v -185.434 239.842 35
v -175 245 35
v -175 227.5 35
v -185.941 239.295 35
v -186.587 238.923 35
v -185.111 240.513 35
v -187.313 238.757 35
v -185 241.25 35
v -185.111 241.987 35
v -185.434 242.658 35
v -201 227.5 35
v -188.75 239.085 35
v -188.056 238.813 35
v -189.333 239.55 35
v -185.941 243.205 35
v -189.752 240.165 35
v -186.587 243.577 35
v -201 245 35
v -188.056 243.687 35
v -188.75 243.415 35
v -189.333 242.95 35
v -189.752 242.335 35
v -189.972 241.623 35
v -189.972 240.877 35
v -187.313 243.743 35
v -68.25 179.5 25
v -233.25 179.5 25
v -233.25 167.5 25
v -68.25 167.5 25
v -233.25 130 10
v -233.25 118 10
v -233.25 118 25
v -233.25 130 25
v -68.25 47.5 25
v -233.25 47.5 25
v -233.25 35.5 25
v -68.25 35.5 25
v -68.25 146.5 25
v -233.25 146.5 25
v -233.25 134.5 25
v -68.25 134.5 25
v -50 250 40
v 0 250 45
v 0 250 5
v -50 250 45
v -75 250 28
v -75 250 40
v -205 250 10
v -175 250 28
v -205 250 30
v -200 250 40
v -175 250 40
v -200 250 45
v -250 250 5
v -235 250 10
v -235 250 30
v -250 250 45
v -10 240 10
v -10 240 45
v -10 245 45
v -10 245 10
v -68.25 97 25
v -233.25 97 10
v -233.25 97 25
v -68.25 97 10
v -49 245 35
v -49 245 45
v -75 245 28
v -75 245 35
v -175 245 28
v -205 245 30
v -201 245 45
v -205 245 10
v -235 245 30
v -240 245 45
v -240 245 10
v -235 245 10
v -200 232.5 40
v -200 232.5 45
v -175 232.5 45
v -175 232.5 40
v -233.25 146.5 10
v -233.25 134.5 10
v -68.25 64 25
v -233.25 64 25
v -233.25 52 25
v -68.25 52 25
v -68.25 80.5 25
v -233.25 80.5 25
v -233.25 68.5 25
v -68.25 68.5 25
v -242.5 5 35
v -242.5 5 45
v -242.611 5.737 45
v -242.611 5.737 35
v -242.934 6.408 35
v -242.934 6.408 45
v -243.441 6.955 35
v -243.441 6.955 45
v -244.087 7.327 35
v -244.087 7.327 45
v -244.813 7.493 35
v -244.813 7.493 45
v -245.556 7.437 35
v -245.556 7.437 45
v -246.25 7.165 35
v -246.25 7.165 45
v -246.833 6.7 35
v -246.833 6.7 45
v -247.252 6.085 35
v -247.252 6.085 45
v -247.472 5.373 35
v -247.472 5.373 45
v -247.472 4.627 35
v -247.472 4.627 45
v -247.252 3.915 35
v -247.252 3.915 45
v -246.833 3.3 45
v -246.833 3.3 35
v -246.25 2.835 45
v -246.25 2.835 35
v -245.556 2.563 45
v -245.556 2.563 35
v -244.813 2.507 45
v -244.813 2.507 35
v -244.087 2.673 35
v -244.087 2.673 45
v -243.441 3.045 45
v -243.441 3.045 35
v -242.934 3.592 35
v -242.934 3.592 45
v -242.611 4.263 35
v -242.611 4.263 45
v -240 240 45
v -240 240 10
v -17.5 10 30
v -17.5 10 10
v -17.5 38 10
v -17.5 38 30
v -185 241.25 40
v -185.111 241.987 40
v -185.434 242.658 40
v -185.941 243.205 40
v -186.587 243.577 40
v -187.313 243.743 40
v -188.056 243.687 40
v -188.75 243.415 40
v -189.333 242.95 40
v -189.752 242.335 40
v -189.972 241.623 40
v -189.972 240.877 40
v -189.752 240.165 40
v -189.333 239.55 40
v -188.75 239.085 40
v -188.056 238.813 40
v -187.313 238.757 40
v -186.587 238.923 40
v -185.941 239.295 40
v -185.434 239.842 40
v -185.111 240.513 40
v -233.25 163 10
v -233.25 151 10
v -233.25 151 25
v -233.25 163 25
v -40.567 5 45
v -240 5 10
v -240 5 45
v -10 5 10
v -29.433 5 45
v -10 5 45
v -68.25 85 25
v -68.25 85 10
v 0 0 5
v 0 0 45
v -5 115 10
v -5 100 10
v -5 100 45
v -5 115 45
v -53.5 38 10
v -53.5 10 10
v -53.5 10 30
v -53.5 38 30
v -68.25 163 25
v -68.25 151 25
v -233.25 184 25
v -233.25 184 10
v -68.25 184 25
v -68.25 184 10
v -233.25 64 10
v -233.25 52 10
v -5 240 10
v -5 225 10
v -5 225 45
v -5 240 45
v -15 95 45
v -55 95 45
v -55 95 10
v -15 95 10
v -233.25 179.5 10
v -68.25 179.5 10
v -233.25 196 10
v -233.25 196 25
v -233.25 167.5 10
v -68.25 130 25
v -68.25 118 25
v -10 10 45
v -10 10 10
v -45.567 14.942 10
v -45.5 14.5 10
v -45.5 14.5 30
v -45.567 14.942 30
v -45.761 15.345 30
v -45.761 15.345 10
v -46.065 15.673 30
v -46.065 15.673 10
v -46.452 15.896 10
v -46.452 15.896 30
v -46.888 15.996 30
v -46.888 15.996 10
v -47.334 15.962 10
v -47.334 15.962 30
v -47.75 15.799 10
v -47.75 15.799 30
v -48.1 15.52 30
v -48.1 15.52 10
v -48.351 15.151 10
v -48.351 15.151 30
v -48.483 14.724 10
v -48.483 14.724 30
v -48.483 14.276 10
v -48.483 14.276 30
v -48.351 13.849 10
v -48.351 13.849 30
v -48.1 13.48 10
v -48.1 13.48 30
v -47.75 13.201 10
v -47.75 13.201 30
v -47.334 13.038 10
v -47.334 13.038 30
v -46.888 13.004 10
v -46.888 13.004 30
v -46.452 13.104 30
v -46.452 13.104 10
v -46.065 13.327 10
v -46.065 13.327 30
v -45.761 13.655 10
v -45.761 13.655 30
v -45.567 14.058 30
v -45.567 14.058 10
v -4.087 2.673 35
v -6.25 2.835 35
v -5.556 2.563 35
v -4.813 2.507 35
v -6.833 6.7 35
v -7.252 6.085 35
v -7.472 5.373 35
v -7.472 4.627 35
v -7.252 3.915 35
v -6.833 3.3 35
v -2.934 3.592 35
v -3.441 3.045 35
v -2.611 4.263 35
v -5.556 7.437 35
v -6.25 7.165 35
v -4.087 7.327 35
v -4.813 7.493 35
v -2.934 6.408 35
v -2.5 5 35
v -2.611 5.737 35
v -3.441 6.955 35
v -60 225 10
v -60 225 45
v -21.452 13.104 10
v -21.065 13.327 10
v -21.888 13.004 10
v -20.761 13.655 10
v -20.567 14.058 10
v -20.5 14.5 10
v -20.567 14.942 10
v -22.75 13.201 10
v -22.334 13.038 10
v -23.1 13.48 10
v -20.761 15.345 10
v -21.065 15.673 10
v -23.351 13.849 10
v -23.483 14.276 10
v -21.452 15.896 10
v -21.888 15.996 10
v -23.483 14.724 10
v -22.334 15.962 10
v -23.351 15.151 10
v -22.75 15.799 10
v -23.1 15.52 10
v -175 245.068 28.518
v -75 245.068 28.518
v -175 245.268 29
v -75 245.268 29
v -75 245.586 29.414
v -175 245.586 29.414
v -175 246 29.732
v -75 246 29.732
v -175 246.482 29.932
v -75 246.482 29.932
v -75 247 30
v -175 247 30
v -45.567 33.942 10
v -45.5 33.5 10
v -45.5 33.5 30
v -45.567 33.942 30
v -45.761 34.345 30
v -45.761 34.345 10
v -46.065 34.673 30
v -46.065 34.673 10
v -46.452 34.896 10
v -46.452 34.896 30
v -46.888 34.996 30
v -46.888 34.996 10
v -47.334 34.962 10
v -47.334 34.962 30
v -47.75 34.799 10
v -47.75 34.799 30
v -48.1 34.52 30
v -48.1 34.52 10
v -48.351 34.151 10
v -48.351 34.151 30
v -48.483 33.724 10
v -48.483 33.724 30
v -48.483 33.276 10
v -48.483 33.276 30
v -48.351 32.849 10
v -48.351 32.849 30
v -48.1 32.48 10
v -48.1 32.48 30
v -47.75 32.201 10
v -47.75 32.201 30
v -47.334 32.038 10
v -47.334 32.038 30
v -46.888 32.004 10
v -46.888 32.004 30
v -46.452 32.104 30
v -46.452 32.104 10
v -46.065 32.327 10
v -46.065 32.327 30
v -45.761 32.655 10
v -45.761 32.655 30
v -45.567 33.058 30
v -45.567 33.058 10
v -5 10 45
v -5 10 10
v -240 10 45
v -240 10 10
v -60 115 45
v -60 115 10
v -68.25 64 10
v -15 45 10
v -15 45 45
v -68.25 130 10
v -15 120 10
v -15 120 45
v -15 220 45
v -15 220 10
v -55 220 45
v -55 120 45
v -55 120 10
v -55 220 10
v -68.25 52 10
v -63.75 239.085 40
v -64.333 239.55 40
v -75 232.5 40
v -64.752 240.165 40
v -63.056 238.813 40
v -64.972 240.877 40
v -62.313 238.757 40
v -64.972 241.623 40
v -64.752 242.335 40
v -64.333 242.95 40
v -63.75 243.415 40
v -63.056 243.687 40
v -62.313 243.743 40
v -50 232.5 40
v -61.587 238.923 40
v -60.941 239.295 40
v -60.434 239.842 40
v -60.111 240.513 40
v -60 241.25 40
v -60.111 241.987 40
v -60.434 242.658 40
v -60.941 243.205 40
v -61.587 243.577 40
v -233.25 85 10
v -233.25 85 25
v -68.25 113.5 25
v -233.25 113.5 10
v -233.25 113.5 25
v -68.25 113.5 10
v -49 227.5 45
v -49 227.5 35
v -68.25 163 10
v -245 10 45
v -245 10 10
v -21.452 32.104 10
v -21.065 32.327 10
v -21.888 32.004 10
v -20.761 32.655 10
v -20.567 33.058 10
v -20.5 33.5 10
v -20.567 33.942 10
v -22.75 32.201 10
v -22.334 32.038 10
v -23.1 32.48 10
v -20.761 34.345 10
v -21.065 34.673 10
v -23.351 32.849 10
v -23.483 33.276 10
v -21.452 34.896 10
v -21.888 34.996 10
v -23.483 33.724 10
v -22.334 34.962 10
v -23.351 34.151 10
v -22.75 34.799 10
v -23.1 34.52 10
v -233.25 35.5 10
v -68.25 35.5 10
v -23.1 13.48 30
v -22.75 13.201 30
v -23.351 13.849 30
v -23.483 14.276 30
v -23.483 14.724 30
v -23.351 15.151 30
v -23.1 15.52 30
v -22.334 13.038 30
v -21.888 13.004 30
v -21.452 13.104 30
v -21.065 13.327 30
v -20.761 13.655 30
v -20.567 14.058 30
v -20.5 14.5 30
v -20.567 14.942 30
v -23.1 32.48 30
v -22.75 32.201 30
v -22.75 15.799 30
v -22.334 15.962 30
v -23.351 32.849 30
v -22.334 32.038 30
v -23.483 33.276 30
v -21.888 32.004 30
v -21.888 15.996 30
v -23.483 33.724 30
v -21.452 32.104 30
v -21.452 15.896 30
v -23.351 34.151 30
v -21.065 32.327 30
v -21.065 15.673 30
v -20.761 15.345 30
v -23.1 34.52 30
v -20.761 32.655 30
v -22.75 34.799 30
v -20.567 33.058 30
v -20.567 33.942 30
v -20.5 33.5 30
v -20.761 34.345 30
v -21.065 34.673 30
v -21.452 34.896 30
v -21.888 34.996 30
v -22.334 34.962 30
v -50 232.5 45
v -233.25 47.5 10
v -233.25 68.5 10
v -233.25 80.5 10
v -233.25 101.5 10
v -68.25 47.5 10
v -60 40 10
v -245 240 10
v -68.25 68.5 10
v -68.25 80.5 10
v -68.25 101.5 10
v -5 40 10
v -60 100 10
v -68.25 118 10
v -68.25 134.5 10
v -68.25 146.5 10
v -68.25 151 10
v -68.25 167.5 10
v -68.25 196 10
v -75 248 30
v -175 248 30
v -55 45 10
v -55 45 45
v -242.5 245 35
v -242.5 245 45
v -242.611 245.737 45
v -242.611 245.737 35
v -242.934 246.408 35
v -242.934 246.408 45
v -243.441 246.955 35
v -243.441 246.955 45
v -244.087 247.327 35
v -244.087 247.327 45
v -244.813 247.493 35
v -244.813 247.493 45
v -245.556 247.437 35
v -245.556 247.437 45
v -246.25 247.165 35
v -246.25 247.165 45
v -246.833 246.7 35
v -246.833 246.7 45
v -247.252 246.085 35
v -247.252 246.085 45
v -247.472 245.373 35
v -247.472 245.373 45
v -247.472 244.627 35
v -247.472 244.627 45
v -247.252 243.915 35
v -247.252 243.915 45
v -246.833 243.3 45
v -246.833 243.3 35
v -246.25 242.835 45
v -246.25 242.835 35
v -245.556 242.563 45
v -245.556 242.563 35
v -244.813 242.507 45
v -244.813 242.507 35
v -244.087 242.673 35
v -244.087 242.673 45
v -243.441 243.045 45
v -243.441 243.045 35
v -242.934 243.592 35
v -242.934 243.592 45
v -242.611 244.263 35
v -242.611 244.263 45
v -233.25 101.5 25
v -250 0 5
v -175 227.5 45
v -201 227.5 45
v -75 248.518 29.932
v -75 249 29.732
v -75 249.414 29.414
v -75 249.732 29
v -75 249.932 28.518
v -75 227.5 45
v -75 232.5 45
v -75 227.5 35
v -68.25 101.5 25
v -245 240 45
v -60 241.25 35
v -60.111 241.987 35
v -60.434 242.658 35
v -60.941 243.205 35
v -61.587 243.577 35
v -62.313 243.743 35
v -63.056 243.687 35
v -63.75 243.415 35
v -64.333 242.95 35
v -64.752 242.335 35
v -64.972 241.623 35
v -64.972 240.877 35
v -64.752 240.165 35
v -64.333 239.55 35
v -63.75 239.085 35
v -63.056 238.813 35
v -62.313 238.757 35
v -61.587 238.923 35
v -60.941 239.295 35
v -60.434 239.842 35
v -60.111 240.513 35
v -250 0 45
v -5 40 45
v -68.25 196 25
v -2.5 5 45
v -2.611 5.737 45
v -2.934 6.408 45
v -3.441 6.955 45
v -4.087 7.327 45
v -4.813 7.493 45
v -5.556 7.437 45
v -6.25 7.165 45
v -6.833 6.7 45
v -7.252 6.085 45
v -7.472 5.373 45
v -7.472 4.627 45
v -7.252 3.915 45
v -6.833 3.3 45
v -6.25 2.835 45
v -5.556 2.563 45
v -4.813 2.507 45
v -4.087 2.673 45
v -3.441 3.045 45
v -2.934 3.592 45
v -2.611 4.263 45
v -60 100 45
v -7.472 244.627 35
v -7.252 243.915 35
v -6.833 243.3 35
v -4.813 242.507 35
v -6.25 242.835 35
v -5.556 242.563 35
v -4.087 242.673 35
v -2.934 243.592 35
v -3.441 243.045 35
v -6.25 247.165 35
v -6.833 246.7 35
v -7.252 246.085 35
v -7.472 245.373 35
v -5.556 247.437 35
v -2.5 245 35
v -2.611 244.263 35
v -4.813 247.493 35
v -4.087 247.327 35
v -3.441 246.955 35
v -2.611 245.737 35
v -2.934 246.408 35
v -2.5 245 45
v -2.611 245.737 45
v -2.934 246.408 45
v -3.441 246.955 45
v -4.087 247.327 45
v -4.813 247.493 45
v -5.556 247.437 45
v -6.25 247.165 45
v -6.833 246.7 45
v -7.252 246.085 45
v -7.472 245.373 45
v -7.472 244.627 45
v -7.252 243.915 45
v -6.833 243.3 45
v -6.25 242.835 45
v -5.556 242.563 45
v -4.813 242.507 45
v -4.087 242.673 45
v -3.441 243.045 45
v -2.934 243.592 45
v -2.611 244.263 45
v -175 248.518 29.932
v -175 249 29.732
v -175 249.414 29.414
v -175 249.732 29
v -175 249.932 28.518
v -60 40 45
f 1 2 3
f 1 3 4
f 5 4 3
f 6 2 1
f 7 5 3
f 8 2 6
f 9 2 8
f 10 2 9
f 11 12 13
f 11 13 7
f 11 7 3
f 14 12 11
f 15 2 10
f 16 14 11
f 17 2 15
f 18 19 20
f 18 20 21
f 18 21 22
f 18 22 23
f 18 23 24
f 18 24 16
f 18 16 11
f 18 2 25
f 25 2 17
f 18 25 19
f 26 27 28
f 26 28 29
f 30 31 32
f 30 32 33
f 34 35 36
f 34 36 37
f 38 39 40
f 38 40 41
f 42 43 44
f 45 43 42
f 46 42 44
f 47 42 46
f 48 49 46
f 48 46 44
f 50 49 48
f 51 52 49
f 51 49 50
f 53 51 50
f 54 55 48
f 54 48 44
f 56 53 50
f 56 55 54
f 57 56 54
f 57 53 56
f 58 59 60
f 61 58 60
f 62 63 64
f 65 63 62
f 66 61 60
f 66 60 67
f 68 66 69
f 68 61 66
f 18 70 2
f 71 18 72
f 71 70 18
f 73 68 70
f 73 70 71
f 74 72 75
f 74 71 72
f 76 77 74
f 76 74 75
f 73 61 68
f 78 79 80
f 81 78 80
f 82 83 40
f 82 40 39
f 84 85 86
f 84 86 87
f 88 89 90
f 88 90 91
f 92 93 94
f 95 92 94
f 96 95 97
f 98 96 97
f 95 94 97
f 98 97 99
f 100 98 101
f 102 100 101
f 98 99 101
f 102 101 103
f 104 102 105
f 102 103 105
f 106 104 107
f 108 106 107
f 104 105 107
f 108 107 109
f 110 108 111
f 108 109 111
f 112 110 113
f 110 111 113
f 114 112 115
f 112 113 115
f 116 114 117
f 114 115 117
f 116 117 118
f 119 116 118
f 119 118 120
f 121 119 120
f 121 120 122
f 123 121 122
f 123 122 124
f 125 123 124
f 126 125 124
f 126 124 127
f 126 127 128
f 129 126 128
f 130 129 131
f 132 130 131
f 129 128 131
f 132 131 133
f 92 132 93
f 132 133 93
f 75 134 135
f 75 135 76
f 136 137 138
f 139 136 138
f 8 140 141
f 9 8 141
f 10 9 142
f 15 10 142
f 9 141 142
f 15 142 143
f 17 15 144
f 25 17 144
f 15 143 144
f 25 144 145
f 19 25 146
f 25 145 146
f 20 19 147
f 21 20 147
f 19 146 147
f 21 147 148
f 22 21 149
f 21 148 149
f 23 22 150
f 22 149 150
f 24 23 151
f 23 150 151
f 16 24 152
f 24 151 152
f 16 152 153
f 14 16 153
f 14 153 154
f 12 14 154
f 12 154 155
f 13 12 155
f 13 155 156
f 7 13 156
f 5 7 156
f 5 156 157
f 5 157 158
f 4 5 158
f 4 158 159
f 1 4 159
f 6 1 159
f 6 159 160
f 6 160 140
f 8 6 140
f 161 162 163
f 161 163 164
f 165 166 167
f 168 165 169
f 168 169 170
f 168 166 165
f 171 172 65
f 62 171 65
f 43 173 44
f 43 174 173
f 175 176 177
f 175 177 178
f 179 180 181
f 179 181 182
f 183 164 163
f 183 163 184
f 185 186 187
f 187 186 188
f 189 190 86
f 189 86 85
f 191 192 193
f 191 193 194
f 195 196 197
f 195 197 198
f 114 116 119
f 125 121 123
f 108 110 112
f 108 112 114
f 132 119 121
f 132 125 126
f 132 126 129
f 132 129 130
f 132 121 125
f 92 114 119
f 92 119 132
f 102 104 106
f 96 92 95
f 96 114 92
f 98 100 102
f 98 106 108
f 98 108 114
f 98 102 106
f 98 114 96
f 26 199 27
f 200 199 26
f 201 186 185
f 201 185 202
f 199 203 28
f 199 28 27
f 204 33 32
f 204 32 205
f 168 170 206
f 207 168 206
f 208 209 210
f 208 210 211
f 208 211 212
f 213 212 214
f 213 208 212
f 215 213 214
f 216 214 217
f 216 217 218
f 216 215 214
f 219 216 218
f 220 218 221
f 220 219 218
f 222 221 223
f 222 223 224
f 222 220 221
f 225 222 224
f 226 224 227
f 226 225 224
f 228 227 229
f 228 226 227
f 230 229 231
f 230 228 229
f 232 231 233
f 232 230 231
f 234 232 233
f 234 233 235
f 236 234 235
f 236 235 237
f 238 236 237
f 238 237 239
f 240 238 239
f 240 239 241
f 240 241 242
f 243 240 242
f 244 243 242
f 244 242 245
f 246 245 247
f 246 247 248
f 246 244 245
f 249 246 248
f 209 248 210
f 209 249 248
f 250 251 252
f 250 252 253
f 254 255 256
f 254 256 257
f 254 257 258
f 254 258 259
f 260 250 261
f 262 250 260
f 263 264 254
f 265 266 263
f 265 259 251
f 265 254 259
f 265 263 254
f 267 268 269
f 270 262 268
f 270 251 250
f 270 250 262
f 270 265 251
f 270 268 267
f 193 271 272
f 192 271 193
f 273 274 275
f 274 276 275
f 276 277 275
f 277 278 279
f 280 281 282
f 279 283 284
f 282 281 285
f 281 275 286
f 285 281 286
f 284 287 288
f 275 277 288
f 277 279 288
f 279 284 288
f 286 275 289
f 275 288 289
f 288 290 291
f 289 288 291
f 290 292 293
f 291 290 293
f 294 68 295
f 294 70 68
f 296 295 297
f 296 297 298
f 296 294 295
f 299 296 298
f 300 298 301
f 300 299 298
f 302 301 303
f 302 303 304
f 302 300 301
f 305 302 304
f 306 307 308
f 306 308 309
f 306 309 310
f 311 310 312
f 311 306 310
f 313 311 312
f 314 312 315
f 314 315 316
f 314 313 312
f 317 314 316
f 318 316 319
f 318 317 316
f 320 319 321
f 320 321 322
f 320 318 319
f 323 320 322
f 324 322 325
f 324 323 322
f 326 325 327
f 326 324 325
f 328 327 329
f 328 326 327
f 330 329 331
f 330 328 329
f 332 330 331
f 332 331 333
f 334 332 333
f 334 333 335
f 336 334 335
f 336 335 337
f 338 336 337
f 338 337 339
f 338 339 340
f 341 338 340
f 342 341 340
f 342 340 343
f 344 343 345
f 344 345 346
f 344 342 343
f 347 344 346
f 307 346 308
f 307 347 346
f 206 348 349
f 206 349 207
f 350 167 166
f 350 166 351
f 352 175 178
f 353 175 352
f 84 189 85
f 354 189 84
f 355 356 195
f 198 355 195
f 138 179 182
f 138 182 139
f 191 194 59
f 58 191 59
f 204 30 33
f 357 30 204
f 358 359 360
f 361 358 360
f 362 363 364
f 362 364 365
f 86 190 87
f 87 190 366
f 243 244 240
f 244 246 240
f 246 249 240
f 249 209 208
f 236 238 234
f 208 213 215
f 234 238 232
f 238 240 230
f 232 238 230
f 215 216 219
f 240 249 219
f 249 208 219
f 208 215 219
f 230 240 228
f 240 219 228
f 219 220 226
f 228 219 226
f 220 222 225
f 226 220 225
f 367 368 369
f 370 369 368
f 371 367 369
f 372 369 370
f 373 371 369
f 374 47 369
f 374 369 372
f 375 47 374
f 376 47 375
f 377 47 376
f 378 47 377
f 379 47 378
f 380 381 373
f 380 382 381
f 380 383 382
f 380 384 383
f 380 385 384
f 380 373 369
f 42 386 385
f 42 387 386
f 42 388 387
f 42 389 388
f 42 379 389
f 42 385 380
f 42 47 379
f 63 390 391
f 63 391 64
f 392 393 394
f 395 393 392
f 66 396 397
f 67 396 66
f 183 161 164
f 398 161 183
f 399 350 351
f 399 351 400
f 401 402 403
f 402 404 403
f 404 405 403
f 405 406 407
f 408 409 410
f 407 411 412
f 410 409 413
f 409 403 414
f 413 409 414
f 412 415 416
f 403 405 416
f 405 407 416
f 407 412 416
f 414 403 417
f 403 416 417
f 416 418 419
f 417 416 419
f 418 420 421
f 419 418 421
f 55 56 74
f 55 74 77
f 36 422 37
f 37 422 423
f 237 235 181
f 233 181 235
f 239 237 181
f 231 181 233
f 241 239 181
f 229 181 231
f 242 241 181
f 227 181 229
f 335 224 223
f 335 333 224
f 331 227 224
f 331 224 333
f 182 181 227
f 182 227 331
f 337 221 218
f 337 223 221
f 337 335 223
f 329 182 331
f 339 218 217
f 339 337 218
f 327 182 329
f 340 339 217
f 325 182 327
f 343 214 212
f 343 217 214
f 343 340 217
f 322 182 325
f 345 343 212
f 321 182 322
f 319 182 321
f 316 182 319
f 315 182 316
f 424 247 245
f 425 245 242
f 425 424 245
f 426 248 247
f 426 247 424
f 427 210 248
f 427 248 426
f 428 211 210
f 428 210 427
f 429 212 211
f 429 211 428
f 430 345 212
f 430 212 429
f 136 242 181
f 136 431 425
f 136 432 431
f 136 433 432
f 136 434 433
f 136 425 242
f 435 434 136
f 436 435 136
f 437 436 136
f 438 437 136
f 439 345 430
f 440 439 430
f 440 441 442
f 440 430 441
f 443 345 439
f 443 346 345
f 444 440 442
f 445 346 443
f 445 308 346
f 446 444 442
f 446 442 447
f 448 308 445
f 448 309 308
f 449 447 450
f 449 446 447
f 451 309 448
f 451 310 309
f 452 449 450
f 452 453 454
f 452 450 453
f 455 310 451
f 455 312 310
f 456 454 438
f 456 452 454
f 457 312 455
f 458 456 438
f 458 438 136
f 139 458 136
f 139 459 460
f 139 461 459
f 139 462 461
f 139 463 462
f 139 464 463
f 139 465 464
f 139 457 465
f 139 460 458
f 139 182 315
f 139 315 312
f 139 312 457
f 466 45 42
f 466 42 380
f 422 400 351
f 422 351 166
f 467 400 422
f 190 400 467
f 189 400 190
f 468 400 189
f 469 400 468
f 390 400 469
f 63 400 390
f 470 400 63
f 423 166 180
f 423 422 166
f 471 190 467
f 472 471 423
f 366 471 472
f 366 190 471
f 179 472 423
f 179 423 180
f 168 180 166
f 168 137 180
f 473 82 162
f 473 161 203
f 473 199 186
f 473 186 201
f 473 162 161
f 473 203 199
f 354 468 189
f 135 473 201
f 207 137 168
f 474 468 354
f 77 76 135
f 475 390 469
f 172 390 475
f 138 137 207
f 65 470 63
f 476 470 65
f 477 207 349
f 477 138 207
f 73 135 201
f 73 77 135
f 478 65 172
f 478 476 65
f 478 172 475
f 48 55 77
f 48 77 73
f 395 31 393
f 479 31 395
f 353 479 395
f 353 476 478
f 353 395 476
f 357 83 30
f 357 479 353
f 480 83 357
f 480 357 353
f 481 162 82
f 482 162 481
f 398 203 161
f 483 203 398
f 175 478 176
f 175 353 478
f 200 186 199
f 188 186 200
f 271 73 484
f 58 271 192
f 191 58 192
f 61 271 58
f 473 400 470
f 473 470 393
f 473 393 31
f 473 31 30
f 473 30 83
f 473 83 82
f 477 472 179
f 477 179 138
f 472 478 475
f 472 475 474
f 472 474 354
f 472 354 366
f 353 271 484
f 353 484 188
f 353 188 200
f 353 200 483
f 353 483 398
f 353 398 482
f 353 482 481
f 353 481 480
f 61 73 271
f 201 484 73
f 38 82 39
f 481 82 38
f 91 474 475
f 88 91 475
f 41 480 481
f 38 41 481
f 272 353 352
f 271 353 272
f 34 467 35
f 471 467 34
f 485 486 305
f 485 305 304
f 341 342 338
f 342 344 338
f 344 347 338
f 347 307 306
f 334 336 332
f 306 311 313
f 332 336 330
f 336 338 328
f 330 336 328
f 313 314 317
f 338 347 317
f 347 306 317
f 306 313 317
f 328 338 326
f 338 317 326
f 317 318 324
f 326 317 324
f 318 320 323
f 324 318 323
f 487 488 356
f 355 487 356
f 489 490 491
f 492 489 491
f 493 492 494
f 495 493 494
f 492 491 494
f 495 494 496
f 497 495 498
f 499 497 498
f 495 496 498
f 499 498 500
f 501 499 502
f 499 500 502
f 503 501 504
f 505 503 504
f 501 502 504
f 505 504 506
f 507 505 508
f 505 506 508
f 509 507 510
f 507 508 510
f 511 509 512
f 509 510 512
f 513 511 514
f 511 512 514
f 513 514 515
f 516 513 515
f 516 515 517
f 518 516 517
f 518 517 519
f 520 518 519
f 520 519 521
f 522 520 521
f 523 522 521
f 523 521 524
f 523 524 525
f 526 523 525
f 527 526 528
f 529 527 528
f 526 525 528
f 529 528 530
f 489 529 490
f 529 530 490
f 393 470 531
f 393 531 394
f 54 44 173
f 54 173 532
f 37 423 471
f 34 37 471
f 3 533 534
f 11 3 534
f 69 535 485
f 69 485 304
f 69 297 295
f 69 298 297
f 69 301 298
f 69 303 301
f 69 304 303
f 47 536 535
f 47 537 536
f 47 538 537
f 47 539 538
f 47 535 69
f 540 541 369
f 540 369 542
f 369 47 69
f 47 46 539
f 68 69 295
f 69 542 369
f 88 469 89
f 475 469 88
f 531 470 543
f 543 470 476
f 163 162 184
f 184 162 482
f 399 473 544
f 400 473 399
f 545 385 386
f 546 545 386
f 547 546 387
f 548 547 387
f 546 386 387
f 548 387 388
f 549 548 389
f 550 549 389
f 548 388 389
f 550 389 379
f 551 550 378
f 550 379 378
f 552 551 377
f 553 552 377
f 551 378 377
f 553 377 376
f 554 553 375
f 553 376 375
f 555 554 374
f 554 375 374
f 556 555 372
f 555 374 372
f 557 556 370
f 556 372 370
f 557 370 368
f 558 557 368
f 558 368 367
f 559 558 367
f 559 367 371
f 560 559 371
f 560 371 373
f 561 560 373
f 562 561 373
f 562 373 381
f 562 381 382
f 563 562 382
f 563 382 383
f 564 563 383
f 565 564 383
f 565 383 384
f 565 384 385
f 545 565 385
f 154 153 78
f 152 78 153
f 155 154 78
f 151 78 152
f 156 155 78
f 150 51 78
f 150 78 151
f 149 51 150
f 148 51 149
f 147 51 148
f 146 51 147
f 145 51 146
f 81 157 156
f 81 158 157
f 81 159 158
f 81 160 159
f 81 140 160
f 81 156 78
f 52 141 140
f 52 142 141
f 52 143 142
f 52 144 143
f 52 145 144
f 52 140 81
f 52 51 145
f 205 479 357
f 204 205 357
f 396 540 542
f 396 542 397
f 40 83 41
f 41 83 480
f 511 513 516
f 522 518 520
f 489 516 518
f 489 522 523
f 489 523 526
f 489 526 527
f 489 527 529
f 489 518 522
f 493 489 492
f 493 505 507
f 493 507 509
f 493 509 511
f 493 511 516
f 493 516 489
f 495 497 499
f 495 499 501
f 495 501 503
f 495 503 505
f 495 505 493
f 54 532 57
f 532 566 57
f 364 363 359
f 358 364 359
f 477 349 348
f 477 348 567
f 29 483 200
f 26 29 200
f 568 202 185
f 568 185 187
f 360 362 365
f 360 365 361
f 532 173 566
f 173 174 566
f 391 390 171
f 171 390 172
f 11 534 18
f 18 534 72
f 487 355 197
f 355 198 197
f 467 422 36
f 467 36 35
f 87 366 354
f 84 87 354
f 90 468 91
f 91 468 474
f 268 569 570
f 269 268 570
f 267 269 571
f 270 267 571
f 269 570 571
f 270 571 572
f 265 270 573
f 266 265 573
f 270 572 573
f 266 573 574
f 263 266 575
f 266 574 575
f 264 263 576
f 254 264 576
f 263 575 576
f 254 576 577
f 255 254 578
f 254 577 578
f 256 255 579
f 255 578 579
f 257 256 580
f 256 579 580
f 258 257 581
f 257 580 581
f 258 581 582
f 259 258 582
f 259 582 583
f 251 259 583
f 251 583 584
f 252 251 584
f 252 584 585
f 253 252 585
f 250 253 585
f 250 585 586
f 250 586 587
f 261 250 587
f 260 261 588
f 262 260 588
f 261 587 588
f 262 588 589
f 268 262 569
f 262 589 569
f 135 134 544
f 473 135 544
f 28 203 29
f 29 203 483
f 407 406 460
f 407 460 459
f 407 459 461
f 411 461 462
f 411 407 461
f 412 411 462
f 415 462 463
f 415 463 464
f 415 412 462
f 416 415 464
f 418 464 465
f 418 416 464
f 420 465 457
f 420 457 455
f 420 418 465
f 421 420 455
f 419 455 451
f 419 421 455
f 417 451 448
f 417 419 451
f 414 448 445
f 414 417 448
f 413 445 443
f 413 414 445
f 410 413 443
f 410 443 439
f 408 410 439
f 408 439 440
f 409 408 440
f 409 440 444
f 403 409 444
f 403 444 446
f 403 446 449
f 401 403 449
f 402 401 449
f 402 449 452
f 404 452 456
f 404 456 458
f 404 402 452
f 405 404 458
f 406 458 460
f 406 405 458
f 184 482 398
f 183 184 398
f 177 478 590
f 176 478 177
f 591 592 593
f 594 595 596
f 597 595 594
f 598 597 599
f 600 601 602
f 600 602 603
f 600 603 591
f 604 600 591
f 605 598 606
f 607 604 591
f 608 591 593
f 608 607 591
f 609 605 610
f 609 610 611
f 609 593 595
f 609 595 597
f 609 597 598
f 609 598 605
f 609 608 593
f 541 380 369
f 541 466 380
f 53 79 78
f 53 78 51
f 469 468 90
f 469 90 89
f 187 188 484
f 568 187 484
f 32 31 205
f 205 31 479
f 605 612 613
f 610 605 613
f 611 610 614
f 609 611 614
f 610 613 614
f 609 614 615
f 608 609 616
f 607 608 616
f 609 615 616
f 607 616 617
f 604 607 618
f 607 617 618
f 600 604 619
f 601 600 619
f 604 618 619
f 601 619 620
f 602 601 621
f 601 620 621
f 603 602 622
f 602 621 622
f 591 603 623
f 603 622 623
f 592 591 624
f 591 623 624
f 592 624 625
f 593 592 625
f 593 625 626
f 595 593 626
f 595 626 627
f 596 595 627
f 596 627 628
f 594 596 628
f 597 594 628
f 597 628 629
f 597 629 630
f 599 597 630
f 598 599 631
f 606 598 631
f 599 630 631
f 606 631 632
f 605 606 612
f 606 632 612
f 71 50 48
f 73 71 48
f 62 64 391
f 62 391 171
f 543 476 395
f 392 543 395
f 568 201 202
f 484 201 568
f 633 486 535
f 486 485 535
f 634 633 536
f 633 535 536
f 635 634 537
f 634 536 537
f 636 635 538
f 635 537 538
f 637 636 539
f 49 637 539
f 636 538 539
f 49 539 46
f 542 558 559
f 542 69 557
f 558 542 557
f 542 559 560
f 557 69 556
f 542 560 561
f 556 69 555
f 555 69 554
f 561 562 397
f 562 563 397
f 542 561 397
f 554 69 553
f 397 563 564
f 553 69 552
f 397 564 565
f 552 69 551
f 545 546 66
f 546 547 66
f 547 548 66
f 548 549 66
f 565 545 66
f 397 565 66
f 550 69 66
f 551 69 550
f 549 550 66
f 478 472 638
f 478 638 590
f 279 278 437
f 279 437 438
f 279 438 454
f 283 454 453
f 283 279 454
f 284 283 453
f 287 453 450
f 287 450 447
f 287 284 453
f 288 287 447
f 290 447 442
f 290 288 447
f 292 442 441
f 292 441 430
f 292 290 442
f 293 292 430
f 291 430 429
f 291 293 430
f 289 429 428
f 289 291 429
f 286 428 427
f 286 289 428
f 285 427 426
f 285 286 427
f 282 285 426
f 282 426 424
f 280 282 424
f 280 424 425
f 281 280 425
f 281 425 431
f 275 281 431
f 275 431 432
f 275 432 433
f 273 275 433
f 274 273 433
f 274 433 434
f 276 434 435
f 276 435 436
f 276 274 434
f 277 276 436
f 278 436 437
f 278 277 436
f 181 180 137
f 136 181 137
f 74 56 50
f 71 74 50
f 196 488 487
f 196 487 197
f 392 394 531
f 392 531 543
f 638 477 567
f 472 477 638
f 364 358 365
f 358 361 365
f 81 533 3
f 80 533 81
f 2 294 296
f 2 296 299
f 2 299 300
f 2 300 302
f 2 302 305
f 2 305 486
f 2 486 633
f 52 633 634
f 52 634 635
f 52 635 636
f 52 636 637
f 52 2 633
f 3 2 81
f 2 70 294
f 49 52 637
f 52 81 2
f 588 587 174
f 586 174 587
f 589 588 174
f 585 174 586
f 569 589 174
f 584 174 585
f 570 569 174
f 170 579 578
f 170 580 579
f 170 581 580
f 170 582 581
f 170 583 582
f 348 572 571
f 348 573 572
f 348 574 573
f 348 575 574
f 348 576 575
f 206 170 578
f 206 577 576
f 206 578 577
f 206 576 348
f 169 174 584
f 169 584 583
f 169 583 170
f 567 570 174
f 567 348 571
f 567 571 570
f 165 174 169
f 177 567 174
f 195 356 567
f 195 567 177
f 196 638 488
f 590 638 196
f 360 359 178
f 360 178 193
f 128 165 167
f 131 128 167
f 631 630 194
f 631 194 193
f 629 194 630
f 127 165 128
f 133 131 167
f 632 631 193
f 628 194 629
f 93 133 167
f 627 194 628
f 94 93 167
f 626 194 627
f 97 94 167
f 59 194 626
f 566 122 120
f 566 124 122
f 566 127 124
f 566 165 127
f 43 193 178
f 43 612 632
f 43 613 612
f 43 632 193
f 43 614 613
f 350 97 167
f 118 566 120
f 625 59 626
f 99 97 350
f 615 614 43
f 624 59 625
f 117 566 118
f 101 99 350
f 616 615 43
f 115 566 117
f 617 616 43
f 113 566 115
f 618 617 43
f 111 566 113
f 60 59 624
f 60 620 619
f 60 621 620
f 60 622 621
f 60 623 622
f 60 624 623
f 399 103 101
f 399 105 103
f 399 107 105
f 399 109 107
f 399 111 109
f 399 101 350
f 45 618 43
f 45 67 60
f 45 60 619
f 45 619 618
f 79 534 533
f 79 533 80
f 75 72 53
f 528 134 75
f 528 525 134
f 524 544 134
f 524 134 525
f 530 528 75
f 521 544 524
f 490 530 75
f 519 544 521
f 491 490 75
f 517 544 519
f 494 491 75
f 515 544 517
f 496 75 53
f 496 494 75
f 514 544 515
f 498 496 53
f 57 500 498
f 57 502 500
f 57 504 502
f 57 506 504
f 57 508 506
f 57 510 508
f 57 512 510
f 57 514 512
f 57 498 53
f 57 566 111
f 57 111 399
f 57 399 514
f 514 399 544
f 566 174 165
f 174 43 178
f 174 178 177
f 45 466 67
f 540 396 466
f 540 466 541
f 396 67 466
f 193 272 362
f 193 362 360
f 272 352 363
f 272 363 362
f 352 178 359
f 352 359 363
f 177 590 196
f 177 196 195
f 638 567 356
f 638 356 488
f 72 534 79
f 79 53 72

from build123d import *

# Parameters (mm, degrees)
SKETCH1_W                        = 250
SKETCH1_H                        = 250
BOSS_EXTRUDE1_DEPTH              = 50
SKETCH2_W                        = 40
SKETCH2_H                        = 100
SKETCH2_H_2                      = 50
CUT_EXTRUDE1_DEPTH               = 45
FILLET1_R                        = 5
FILLET2_R                        = 5
SKETCH5_R                        = 6.25
CUT_EXTRUDE2_DEPTH               = 22
FILLET5_R                        = 1.5
LPATTERN4_COUNT                  = 10
LPATTERN4_PITCH                  = 16.5
LPATTERN4_COUNT_DIR2             = 10
LPATTERN4_PITCH_DIR2             = 16.5
FILLET5_OF_LPATTERN4_R           = 1.5
CUT_EXTRUDE4_DEPTH               = 45
SKETCH8_W                        = 100
SKETCH8_H                        = 20
CUT_EXTRUDE5_DEPTH               = 20
FILLET6_R                        = 2.5
FILLET7_R                        = 2
SKETCH10_R                       = 13.5
CUT_EXTRUDE6_DEPTH               = 358.071421427
SKETCH4_W                        = 25
SKETCH4_H                        = 17.5
CUT_EXTRUDE7_DEPTH               = 10
VERRUNDUNG1_R                    = 2.5
SKIZZE2_W                        = 25
SKIZZE2_H                        = 5
AUFSATZ_LINEAR_AUSTRAGEN1_DEPTH  = 12.5
AUFSATZ_LINEAR_AUSTRAGEN2_DEPTH  = 10
SKIZZE11_W                       = 164
SKIZZE11_H                       = 164
SCHNITT_LINEAR_AUSTRAGEN6_DEPTH  = 10
SKIZZE12_W                       = 174
SKIZZE12_H                       = 174
SCHNITT_LINEAR_AUSTRAGEN7_DEPTH  = 2.5
SKIZZE13_R                       = 1.5
SCHNITT_LINEAR_AUSTRAGEN8_DEPTH  = 2.5
SKIZZE14_W                       = 10
SKIZZE14_H                       = 10
AUFSATZ_LINEAR_AUSTRAGEN3_DEPTH  = 45
SKIZZE16_W                       = 5
SKIZZE16_H                       = 250
SCHNITT_LINEAR_AUSTRAGEN9_DEPTH  = 358.071421427
SKIZZE18_R                       = 2.5
SCHNITT_LINEAR_AUSTRAGEN10_DEPTH = 10
SKIZZE21_W                       = 250
SKIZZE21_H                       = 250
SCHNITT_LINEAR_AUSTRAGEN13_DEPTH = 10
SKIZZE25_W                       = 250
SKIZZE25_H                       = 250
AUFSATZ_LINEAR_AUSTRAGEN7_DEPTH  = 5
SKIZZE26_W                       = 36
SKIZZE26_H                       = 28
SKIZZE26_R                       = 1.5
AUFSATZ_LINEAR_AUSTRAGEN8_DEPTH  = 20
SKIZZE27_W                       = 165
SKIZZE27_H                       = 12
AUFSATZ_LINEAR_AUSTRAGEN9_DEPTH  = 15
SKIZZE28_W                       = 30
SKIZZE28_H                       = 20
SCHNITT_LINEAR_AUSTRAGEN14_DEPTH = 15
SKIZZE29_R                       = 2.5
SCHNITT_LINEAR_AUSTRAGEN15_DEPTH = 15


with BuildPart() as part:
    # Sketch1 → Boss-Extrude1 (new body)
    with BuildSketch(Plane.XY):
        with Locations((-125, 125)):
            Rectangle(SKETCH1_W, SKETCH1_H)
    extrude(amount=BOSS_EXTRUDE1_DEPTH)

    # Sketch2 → Cut-Extrude1 (cut)
    with BuildSketch(Plane.XY.offset(50)):
        with Locations((-35, 170)):
            Rectangle(SKETCH2_W, SKETCH2_H)
        with Locations((-35, 70)):
            Rectangle(SKETCH2_W, SKETCH2_H_2)
    extrude(amount=-CUT_EXTRUDE1_DEPTH, mode=Mode.SUBTRACT)

    # Fillet1
    fillet1_edges = [part.edges().sort_by_distance(p)[0] for p in [
        (-55, 170, 50),
        (-35, 120, 50),
        (-15, 170, 50),
        (-35, 220, 50),
    ]]
    fillet(fillet1_edges, radius=FILLET1_R)

    # Fillet2
    fillet2_edges = [part.edges().sort_by_distance(p)[0] for p in [
        (-55, 70, 50),
        (-35, 45, 50),
        (-15, 70, 50),
        (-35, 95, 50),
    ]]
    fillet(fillet2_edges, radius=FILLET2_R)

    # Sketch5 → Cut-Extrude2 (cut)
    with BuildSketch(Plane.XY.offset(50)):
        with Locations((-225, 190)):
            Circle(SKETCH5_R)
    cut_extrude2 = extrude(amount=-CUT_EXTRUDE2_DEPTH, mode=Mode.SUBTRACT)

    # Fillet5
    fillet5_edges = [part.edges().sort_by_distance(p)[0] for p in [
        (-231.25, 190, 50),
    ]]
    fillet(fillet5_edges, radius=FILLET5_R)

    # LPattern4: Cut-Extrude2 10 × 10
    with Locations(*[(i * LPATTERN4_PITCH, -j * LPATTERN4_PITCH_DIR2, 0) for i in range(LPATTERN4_COUNT) for j in range(LPATTERN4_COUNT_DIR2) if (i, j) != (0, 0)]):
        add(cut_extrude2, mode=Mode.SUBTRACT)

    # Fillet5 of LPattern4
    fillet5_of_lpattern4_edges = [part.edges().sort_by_distance(p)[0] for p in [
        (-231.25, 173.5, 50),
        (-231.25, 157, 50),
        (-231.25, 140.5, 50),
        (-231.25, 124, 50),
        (-231.25, 107.5, 50),
        (-231.25, 91, 50),
        (-231.25, 74.5, 50),
        (-231.25, 58, 50),
        (-231.25, 41.5, 50),
        (-214.75, 190, 50),
        (-214.75, 173.5, 50),
        (-214.75, 157, 50),
        (-214.75, 140.5, 50),
        (-214.75, 124, 50),
        (-214.75, 107.5, 50),
        (-214.75, 91, 50),
        (-214.75, 74.5, 50),
        (-214.75, 58, 50),
        (-214.75, 41.5, 50),
        (-198.25, 190, 50),
        (-198.25, 173.5, 50),
        (-198.25, 157, 50),
        (-198.25, 140.5, 50),
        (-198.25, 124, 50),
        (-198.25, 107.5, 50),
        (-198.25, 91, 50),
        (-198.25, 74.5, 50),
        (-198.25, 58, 50),
        (-198.25, 41.5, 50),
        (-181.75, 190, 50),
        (-181.75, 173.5, 50),
        (-181.75, 157, 50),
        (-181.75, 140.5, 50),
        (-181.75, 124, 50),
        (-181.75, 107.5, 50),
        (-181.75, 91, 50),
        (-181.75, 74.5, 50),
        (-181.75, 58, 50),
        (-181.75, 41.5, 50),
        (-165.25, 190, 50),
        (-165.25, 173.5, 50),
        (-165.25, 157, 50),
        (-165.25, 140.5, 50),
        (-165.25, 124, 50),
        (-165.25, 107.5, 50),
        (-165.25, 91, 50),
        (-165.25, 74.5, 50),
        (-165.25, 58, 50),
        (-165.25, 41.5, 50),
        (-148.75, 190, 50),
        (-148.75, 173.5, 50),
        (-148.75, 157, 50),
        (-148.75, 140.5, 50),
        (-148.75, 124, 50),
        (-148.75, 107.5, 50),
        (-148.75, 91, 50),
        (-148.75, 74.5, 50),
        (-148.75, 58, 50),
        (-148.75, 41.5, 50),
        (-132.25, 190, 50),
        (-132.25, 173.5, 50),
        (-132.25, 157, 50),
        (-132.25, 140.5, 50),
        (-132.25, 124, 50),
        (-132.25, 107.5, 50),
        (-132.25, 91, 50),
        (-132.25, 74.5, 50),
        (-132.25, 58, 50),
        (-132.25, 41.5, 50),
        (-115.75, 190, 50),
        (-115.75, 173.5, 50),
        (-115.75, 157, 50),
        (-115.75, 140.5, 50),
        (-115.75, 124, 50),
        (-115.75, 107.5, 50),
        (-115.75, 91, 50),
        (-115.75, 74.5, 50),
        (-115.75, 58, 50),
        (-115.75, 41.5, 50),
        (-99.25, 190, 50),
        (-99.25, 173.5, 50),
        (-99.25, 157, 50),
        (-99.25, 140.5, 50),
        (-99.25, 124, 50),
        (-99.25, 107.5, 50),
        (-99.25, 91, 50),
        (-99.25, 74.5, 50),
        (-99.25, 58, 50),
        (-99.25, 41.5, 50),
        (-82.75, 190, 50),
        (-82.75, 173.5, 50),
        (-82.75, 157, 50),
        (-82.75, 140.5, 50),
        (-82.75, 124, 50),
        (-82.75, 107.5, 50),
        (-82.75, 91, 50),
        (-82.75, 74.5, 50),
        (-82.75, 58, 50),
        (-82.75, 41.5, 50),
    ]]
    fillet(fillet5_of_lpattern4_edges, radius=FILLET5_OF_LPATTERN4_R)

    # Sketch7 → Cut-Extrude4 (cut)
    with BuildSketch(Plane(origin=(0, 0, 0), x_dir=(-1, 0, 0), z_dir=(0, 0, -1))):
        Polygon((5, 245), (245, 245), (245, 5), (5, 5), (5, 40), (60, 40), (60, 100), (5, 100), (5, 115), (60, 115), (60, 225), (5, 225), align=None)
    extrude(amount=-CUT_EXTRUDE4_DEPTH, mode=Mode.SUBTRACT)

    # Sketch8 → Cut-Extrude5 (cut)
    with BuildSketch(Plane.XY.offset(50)):
        with Locations((-125, 240)):
            Rectangle(SKETCH8_W, SKETCH8_H)
    extrude(amount=-CUT_EXTRUDE5_DEPTH, mode=Mode.SUBTRACT)

    # Fillet6
    fillet6_edges = [part.edges().sort_by_distance(p)[0] for p in [
        (-125, 230, 45),
        (-125, 230, 50),
    ]]
    fillet(fillet6_edges, radius=FILLET6_R - 0.0001)  # a hair under: the kernel refuses the full size

    # Fillet7
    fillet7_edges = [part.edges().sort_by_distance(p)[0] for p in [
        (-125, 245, 30),
        (-125, 250, 30),
    ]]
    fillet(fillet7_edges, radius=FILLET7_R)

    # Sketch10 → Cut-Extrude6 (cut, through all)
    with BuildSketch(Plane.XY.offset(50)):
        with Locations((-35, 20)):
            Circle(SKETCH10_R)
    extrude(amount=-CUT_EXTRUDE6_DEPTH, mode=Mode.SUBTRACT)

    # Sketch4 → Cut-Extrude7 (cut)
    with BuildSketch(Plane.XY.offset(50)):
        with Locations((-187.5, 241.25)):
            Rectangle(SKETCH4_W, SKETCH4_H)
        with Locations((-62.5, 241.25)):
            Rectangle(SKETCH4_W, SKETCH4_H)
    extrude(amount=-CUT_EXTRUDE7_DEPTH, mode=Mode.SUBTRACT)

    # Verrundung1
    verrundung1_edges = [part.edges().sort_by_distance(p)[0] for p in [
        (-48.5, 20, 45),
        (-48.5, 20, 50),
    ]]
    fillet(verrundung1_edges, radius=VERRUNDUNG1_R - 0.0001)  # a hair under: the kernel refuses the full size

    # Skizze2 → Aufsatz-Linear austragen1 (add)
    with BuildSketch(Plane.XZ.offset(-245)):
        with Locations((-187.5, 37.5)):
            Rectangle(SKIZZE2_W, SKIZZE2_H)
        with Locations((-62.5, 37.5)):
            Rectangle(SKIZZE2_W, SKIZZE2_H)
    extrude(amount=AUFSATZ_LINEAR_AUSTRAGEN1_DEPTH)

    # Skizze4 → Aufsatz-Linear austragen2 (add)
    with BuildSketch(Plane(origin=(0, 0, 45), x_dir=(-1, 0, 0), z_dir=(0, 0, -1))):
        Polygon((50, 232.5), (75, 232.5), (75, 227.5), (49, 227.5), (49, 245), (50, 245), align=None)
        Polygon((200, 232.5), (175, 232.5), (175, 227.5), (201, 227.5), (201, 245), (200, 245), align=None)
    extrude(amount=AUFSATZ_LINEAR_AUSTRAGEN2_DEPTH)

    # Skizze11 → Schnitt-Linear austragen6 (cut)
    with BuildSketch(Plane.XY.offset(50)):
        with Locations((-150.75, 115.75)):
            Rectangle(SKIZZE11_W, SKIZZE11_H)
    extrude(amount=-SCHNITT_LINEAR_AUSTRAGEN6_DEPTH, mode=Mode.SUBTRACT)

    # Skizze12 → Schnitt-Linear austragen7 (cut)
    with BuildSketch(Plane.XY.offset(50)):
        with Locations((-150.75, 115.75)):
            Rectangle(SKIZZE12_W, SKIZZE12_H)
    extrude(amount=-SCHNITT_LINEAR_AUSTRAGEN7_DEPTH, mode=Mode.SUBTRACT)

    # Skizze13 → Schnitt-Linear austragen8 (cut)
    with BuildSketch(Plane.XY.offset(47.5)):
        with Locations((-235.25, 200.25)):
            Circle(SKIZZE13_R)
        with Locations((-150.75, 200.25)):
            Circle(SKIZZE13_R)
        with Locations((-66.25, 200.25)):
            Circle(SKIZZE13_R)
        with Locations((-235.25, 115.75)):
            Circle(SKIZZE13_R)
        with Locations((-66.25, 115.75)):
            Circle(SKIZZE13_R)
        with Locations(Location((-66.25, 31.25, 0), (0, 0, 180))):
            Circle(SKIZZE13_R)
        with Locations(Location((-150.75, 31.25, 0), (0, 0, 180))):
            Circle(SKIZZE13_R)
        with Locations(Location((-235.25, 31.25, 0), (0, 0, 180))):
            Circle(SKIZZE13_R)
    extrude(amount=-SCHNITT_LINEAR_AUSTRAGEN8_DEPTH, mode=Mode.SUBTRACT)

    # Skizze14 → Aufsatz-Linear austragen3 (add)
    with BuildSketch(Plane(origin=(0, 0, 45), x_dir=(-1, 0, 0), z_dir=(0, 0, -1))):
        with Locations((5, 245)):
            Rectangle(SKIZZE14_W, SKIZZE14_H)
        with Locations((245, 245)):
            Rectangle(SKIZZE14_W, SKIZZE14_H)
        with Locations((245, 5)):
            Rectangle(SKIZZE14_W, SKIZZE14_H)
        with Locations((5, 5)):
            Rectangle(SKIZZE14_W, SKIZZE14_H)
    extrude(amount=AUFSATZ_LINEAR_AUSTRAGEN3_DEPTH)

    # Skizze16 → Schnitt-Linear austragen9 (cut, through all)
    with BuildSketch(Plane.ZY.offset(250)):
        with Locations((47.5, 125)):
            Rectangle(SKIZZE16_W, SKIZZE16_H)
    extrude(amount=-SCHNITT_LINEAR_AUSTRAGEN9_DEPTH, mode=Mode.SUBTRACT)

    # Skizze18 → Schnitt-Linear austragen10 (cut)
    with BuildSketch(Plane.XY.offset(45)):
        with Locations((-245, 245)):
            Circle(SKIZZE18_R)
        with Locations((-5, 245)):
            Circle(SKIZZE18_R)
        with Locations((-5, 5)):
            Circle(SKIZZE18_R)
        with Locations((-245, 5)):
            Circle(SKIZZE18_R)
    extrude(amount=-SCHNITT_LINEAR_AUSTRAGEN10_DEPTH, mode=Mode.SUBTRACT)

    # Skizze21 → Schnitt-Linear austragen13 (cut)
    with BuildSketch(Plane(origin=(0, 0, 0), x_dir=(-1, 0, 0), z_dir=(0, 0, -1))):
        with Locations((125, 125)):
            Rectangle(SKIZZE21_W, SKIZZE21_H)
    extrude(amount=-SCHNITT_LINEAR_AUSTRAGEN13_DEPTH, mode=Mode.SUBTRACT)

    # Skizze25 → Aufsatz-Linear austragen7 (add)
    with BuildSketch(Plane(origin=(0, 0, 10), x_dir=(-1, 0, 0), z_dir=(0, 0, -1))):
        with Locations((125, 125)):
            Rectangle(SKIZZE25_W, SKIZZE25_H)
    extrude(amount=AUFSATZ_LINEAR_AUSTRAGEN7_DEPTH)

    # Skizze26 → Aufsatz-Linear austragen8 (add)
    with BuildSketch(Plane.XY.offset(10)):
        with Locations((-35.5, 24)):
            Rectangle(SKIZZE26_W, SKIZZE26_H)
        with Locations((-47, 33.5)):
            Circle(SKIZZE26_R, mode=Mode.SUBTRACT)
        with Locations((-22, 14.5)):
            Circle(SKIZZE26_R, mode=Mode.SUBTRACT)
        with Locations((-47, 14.5)):
            Circle(SKIZZE26_R, mode=Mode.SUBTRACT)
        with Locations((-22, 33.5)):
            Circle(SKIZZE26_R, mode=Mode.SUBTRACT)
    extrude(amount=AUFSATZ_LINEAR_AUSTRAGEN8_DEPTH)

    # Skizze27 → Aufsatz-Linear austragen9 (add)
    with BuildSketch(Plane.XY.offset(10)):
        with Locations((-150.75, 173.5)):
            Rectangle(SKIZZE27_W, SKIZZE27_H)
        with Locations((-150.75, 190)):
            Rectangle(SKIZZE27_W, SKIZZE27_H)
        with Locations((-150.75, 157)):
            Rectangle(SKIZZE27_W, SKIZZE27_H)
        with Locations((-150.75, 140.5)):
            Rectangle(SKIZZE27_W, SKIZZE27_H)
        with Locations((-150.75, 124)):
            Rectangle(SKIZZE27_W, SKIZZE27_H)
        with Locations((-150.75, 107.5)):
            Rectangle(SKIZZE27_W, SKIZZE27_H)
        with Locations((-150.75, 91)):
            Rectangle(SKIZZE27_W, SKIZZE27_H)
        with Locations((-150.75, 74.5)):
            Rectangle(SKIZZE27_W, SKIZZE27_H)
        with Locations((-150.75, 58)):
            Rectangle(SKIZZE27_W, SKIZZE27_H)
        with Locations((-150.75, 41.5)):
            Rectangle(SKIZZE27_W, SKIZZE27_H)
    extrude(amount=AUFSATZ_LINEAR_AUSTRAGEN9_DEPTH)

    # Skizze28 → Schnitt-Linear austragen14 (cut)
    with BuildSketch(Plane(origin=(0, 250, 0), x_dir=(1, 0, 0), z_dir=(0, 1, 0))):
        with Locations((-220, -20)):
            Rectangle(SKIZZE28_W, SKIZZE28_H)
    extrude(amount=-SCHNITT_LINEAR_AUSTRAGEN14_DEPTH, mode=Mode.SUBTRACT)

    # Skizze29 → Schnitt-Linear austragen15 (cut)
    with BuildSketch(Plane.XY.offset(40)):
        with Locations((-187.5, 241.25)):
            Circle(SKIZZE29_R)
        with Locations((-62.5, 241.25)):
            Circle(SKIZZE29_R)
    extrude(amount=-SCHNITT_LINEAR_AUSTRAGEN15_DEPTH, mode=Mode.SUBTRACT)


solid = part.part
